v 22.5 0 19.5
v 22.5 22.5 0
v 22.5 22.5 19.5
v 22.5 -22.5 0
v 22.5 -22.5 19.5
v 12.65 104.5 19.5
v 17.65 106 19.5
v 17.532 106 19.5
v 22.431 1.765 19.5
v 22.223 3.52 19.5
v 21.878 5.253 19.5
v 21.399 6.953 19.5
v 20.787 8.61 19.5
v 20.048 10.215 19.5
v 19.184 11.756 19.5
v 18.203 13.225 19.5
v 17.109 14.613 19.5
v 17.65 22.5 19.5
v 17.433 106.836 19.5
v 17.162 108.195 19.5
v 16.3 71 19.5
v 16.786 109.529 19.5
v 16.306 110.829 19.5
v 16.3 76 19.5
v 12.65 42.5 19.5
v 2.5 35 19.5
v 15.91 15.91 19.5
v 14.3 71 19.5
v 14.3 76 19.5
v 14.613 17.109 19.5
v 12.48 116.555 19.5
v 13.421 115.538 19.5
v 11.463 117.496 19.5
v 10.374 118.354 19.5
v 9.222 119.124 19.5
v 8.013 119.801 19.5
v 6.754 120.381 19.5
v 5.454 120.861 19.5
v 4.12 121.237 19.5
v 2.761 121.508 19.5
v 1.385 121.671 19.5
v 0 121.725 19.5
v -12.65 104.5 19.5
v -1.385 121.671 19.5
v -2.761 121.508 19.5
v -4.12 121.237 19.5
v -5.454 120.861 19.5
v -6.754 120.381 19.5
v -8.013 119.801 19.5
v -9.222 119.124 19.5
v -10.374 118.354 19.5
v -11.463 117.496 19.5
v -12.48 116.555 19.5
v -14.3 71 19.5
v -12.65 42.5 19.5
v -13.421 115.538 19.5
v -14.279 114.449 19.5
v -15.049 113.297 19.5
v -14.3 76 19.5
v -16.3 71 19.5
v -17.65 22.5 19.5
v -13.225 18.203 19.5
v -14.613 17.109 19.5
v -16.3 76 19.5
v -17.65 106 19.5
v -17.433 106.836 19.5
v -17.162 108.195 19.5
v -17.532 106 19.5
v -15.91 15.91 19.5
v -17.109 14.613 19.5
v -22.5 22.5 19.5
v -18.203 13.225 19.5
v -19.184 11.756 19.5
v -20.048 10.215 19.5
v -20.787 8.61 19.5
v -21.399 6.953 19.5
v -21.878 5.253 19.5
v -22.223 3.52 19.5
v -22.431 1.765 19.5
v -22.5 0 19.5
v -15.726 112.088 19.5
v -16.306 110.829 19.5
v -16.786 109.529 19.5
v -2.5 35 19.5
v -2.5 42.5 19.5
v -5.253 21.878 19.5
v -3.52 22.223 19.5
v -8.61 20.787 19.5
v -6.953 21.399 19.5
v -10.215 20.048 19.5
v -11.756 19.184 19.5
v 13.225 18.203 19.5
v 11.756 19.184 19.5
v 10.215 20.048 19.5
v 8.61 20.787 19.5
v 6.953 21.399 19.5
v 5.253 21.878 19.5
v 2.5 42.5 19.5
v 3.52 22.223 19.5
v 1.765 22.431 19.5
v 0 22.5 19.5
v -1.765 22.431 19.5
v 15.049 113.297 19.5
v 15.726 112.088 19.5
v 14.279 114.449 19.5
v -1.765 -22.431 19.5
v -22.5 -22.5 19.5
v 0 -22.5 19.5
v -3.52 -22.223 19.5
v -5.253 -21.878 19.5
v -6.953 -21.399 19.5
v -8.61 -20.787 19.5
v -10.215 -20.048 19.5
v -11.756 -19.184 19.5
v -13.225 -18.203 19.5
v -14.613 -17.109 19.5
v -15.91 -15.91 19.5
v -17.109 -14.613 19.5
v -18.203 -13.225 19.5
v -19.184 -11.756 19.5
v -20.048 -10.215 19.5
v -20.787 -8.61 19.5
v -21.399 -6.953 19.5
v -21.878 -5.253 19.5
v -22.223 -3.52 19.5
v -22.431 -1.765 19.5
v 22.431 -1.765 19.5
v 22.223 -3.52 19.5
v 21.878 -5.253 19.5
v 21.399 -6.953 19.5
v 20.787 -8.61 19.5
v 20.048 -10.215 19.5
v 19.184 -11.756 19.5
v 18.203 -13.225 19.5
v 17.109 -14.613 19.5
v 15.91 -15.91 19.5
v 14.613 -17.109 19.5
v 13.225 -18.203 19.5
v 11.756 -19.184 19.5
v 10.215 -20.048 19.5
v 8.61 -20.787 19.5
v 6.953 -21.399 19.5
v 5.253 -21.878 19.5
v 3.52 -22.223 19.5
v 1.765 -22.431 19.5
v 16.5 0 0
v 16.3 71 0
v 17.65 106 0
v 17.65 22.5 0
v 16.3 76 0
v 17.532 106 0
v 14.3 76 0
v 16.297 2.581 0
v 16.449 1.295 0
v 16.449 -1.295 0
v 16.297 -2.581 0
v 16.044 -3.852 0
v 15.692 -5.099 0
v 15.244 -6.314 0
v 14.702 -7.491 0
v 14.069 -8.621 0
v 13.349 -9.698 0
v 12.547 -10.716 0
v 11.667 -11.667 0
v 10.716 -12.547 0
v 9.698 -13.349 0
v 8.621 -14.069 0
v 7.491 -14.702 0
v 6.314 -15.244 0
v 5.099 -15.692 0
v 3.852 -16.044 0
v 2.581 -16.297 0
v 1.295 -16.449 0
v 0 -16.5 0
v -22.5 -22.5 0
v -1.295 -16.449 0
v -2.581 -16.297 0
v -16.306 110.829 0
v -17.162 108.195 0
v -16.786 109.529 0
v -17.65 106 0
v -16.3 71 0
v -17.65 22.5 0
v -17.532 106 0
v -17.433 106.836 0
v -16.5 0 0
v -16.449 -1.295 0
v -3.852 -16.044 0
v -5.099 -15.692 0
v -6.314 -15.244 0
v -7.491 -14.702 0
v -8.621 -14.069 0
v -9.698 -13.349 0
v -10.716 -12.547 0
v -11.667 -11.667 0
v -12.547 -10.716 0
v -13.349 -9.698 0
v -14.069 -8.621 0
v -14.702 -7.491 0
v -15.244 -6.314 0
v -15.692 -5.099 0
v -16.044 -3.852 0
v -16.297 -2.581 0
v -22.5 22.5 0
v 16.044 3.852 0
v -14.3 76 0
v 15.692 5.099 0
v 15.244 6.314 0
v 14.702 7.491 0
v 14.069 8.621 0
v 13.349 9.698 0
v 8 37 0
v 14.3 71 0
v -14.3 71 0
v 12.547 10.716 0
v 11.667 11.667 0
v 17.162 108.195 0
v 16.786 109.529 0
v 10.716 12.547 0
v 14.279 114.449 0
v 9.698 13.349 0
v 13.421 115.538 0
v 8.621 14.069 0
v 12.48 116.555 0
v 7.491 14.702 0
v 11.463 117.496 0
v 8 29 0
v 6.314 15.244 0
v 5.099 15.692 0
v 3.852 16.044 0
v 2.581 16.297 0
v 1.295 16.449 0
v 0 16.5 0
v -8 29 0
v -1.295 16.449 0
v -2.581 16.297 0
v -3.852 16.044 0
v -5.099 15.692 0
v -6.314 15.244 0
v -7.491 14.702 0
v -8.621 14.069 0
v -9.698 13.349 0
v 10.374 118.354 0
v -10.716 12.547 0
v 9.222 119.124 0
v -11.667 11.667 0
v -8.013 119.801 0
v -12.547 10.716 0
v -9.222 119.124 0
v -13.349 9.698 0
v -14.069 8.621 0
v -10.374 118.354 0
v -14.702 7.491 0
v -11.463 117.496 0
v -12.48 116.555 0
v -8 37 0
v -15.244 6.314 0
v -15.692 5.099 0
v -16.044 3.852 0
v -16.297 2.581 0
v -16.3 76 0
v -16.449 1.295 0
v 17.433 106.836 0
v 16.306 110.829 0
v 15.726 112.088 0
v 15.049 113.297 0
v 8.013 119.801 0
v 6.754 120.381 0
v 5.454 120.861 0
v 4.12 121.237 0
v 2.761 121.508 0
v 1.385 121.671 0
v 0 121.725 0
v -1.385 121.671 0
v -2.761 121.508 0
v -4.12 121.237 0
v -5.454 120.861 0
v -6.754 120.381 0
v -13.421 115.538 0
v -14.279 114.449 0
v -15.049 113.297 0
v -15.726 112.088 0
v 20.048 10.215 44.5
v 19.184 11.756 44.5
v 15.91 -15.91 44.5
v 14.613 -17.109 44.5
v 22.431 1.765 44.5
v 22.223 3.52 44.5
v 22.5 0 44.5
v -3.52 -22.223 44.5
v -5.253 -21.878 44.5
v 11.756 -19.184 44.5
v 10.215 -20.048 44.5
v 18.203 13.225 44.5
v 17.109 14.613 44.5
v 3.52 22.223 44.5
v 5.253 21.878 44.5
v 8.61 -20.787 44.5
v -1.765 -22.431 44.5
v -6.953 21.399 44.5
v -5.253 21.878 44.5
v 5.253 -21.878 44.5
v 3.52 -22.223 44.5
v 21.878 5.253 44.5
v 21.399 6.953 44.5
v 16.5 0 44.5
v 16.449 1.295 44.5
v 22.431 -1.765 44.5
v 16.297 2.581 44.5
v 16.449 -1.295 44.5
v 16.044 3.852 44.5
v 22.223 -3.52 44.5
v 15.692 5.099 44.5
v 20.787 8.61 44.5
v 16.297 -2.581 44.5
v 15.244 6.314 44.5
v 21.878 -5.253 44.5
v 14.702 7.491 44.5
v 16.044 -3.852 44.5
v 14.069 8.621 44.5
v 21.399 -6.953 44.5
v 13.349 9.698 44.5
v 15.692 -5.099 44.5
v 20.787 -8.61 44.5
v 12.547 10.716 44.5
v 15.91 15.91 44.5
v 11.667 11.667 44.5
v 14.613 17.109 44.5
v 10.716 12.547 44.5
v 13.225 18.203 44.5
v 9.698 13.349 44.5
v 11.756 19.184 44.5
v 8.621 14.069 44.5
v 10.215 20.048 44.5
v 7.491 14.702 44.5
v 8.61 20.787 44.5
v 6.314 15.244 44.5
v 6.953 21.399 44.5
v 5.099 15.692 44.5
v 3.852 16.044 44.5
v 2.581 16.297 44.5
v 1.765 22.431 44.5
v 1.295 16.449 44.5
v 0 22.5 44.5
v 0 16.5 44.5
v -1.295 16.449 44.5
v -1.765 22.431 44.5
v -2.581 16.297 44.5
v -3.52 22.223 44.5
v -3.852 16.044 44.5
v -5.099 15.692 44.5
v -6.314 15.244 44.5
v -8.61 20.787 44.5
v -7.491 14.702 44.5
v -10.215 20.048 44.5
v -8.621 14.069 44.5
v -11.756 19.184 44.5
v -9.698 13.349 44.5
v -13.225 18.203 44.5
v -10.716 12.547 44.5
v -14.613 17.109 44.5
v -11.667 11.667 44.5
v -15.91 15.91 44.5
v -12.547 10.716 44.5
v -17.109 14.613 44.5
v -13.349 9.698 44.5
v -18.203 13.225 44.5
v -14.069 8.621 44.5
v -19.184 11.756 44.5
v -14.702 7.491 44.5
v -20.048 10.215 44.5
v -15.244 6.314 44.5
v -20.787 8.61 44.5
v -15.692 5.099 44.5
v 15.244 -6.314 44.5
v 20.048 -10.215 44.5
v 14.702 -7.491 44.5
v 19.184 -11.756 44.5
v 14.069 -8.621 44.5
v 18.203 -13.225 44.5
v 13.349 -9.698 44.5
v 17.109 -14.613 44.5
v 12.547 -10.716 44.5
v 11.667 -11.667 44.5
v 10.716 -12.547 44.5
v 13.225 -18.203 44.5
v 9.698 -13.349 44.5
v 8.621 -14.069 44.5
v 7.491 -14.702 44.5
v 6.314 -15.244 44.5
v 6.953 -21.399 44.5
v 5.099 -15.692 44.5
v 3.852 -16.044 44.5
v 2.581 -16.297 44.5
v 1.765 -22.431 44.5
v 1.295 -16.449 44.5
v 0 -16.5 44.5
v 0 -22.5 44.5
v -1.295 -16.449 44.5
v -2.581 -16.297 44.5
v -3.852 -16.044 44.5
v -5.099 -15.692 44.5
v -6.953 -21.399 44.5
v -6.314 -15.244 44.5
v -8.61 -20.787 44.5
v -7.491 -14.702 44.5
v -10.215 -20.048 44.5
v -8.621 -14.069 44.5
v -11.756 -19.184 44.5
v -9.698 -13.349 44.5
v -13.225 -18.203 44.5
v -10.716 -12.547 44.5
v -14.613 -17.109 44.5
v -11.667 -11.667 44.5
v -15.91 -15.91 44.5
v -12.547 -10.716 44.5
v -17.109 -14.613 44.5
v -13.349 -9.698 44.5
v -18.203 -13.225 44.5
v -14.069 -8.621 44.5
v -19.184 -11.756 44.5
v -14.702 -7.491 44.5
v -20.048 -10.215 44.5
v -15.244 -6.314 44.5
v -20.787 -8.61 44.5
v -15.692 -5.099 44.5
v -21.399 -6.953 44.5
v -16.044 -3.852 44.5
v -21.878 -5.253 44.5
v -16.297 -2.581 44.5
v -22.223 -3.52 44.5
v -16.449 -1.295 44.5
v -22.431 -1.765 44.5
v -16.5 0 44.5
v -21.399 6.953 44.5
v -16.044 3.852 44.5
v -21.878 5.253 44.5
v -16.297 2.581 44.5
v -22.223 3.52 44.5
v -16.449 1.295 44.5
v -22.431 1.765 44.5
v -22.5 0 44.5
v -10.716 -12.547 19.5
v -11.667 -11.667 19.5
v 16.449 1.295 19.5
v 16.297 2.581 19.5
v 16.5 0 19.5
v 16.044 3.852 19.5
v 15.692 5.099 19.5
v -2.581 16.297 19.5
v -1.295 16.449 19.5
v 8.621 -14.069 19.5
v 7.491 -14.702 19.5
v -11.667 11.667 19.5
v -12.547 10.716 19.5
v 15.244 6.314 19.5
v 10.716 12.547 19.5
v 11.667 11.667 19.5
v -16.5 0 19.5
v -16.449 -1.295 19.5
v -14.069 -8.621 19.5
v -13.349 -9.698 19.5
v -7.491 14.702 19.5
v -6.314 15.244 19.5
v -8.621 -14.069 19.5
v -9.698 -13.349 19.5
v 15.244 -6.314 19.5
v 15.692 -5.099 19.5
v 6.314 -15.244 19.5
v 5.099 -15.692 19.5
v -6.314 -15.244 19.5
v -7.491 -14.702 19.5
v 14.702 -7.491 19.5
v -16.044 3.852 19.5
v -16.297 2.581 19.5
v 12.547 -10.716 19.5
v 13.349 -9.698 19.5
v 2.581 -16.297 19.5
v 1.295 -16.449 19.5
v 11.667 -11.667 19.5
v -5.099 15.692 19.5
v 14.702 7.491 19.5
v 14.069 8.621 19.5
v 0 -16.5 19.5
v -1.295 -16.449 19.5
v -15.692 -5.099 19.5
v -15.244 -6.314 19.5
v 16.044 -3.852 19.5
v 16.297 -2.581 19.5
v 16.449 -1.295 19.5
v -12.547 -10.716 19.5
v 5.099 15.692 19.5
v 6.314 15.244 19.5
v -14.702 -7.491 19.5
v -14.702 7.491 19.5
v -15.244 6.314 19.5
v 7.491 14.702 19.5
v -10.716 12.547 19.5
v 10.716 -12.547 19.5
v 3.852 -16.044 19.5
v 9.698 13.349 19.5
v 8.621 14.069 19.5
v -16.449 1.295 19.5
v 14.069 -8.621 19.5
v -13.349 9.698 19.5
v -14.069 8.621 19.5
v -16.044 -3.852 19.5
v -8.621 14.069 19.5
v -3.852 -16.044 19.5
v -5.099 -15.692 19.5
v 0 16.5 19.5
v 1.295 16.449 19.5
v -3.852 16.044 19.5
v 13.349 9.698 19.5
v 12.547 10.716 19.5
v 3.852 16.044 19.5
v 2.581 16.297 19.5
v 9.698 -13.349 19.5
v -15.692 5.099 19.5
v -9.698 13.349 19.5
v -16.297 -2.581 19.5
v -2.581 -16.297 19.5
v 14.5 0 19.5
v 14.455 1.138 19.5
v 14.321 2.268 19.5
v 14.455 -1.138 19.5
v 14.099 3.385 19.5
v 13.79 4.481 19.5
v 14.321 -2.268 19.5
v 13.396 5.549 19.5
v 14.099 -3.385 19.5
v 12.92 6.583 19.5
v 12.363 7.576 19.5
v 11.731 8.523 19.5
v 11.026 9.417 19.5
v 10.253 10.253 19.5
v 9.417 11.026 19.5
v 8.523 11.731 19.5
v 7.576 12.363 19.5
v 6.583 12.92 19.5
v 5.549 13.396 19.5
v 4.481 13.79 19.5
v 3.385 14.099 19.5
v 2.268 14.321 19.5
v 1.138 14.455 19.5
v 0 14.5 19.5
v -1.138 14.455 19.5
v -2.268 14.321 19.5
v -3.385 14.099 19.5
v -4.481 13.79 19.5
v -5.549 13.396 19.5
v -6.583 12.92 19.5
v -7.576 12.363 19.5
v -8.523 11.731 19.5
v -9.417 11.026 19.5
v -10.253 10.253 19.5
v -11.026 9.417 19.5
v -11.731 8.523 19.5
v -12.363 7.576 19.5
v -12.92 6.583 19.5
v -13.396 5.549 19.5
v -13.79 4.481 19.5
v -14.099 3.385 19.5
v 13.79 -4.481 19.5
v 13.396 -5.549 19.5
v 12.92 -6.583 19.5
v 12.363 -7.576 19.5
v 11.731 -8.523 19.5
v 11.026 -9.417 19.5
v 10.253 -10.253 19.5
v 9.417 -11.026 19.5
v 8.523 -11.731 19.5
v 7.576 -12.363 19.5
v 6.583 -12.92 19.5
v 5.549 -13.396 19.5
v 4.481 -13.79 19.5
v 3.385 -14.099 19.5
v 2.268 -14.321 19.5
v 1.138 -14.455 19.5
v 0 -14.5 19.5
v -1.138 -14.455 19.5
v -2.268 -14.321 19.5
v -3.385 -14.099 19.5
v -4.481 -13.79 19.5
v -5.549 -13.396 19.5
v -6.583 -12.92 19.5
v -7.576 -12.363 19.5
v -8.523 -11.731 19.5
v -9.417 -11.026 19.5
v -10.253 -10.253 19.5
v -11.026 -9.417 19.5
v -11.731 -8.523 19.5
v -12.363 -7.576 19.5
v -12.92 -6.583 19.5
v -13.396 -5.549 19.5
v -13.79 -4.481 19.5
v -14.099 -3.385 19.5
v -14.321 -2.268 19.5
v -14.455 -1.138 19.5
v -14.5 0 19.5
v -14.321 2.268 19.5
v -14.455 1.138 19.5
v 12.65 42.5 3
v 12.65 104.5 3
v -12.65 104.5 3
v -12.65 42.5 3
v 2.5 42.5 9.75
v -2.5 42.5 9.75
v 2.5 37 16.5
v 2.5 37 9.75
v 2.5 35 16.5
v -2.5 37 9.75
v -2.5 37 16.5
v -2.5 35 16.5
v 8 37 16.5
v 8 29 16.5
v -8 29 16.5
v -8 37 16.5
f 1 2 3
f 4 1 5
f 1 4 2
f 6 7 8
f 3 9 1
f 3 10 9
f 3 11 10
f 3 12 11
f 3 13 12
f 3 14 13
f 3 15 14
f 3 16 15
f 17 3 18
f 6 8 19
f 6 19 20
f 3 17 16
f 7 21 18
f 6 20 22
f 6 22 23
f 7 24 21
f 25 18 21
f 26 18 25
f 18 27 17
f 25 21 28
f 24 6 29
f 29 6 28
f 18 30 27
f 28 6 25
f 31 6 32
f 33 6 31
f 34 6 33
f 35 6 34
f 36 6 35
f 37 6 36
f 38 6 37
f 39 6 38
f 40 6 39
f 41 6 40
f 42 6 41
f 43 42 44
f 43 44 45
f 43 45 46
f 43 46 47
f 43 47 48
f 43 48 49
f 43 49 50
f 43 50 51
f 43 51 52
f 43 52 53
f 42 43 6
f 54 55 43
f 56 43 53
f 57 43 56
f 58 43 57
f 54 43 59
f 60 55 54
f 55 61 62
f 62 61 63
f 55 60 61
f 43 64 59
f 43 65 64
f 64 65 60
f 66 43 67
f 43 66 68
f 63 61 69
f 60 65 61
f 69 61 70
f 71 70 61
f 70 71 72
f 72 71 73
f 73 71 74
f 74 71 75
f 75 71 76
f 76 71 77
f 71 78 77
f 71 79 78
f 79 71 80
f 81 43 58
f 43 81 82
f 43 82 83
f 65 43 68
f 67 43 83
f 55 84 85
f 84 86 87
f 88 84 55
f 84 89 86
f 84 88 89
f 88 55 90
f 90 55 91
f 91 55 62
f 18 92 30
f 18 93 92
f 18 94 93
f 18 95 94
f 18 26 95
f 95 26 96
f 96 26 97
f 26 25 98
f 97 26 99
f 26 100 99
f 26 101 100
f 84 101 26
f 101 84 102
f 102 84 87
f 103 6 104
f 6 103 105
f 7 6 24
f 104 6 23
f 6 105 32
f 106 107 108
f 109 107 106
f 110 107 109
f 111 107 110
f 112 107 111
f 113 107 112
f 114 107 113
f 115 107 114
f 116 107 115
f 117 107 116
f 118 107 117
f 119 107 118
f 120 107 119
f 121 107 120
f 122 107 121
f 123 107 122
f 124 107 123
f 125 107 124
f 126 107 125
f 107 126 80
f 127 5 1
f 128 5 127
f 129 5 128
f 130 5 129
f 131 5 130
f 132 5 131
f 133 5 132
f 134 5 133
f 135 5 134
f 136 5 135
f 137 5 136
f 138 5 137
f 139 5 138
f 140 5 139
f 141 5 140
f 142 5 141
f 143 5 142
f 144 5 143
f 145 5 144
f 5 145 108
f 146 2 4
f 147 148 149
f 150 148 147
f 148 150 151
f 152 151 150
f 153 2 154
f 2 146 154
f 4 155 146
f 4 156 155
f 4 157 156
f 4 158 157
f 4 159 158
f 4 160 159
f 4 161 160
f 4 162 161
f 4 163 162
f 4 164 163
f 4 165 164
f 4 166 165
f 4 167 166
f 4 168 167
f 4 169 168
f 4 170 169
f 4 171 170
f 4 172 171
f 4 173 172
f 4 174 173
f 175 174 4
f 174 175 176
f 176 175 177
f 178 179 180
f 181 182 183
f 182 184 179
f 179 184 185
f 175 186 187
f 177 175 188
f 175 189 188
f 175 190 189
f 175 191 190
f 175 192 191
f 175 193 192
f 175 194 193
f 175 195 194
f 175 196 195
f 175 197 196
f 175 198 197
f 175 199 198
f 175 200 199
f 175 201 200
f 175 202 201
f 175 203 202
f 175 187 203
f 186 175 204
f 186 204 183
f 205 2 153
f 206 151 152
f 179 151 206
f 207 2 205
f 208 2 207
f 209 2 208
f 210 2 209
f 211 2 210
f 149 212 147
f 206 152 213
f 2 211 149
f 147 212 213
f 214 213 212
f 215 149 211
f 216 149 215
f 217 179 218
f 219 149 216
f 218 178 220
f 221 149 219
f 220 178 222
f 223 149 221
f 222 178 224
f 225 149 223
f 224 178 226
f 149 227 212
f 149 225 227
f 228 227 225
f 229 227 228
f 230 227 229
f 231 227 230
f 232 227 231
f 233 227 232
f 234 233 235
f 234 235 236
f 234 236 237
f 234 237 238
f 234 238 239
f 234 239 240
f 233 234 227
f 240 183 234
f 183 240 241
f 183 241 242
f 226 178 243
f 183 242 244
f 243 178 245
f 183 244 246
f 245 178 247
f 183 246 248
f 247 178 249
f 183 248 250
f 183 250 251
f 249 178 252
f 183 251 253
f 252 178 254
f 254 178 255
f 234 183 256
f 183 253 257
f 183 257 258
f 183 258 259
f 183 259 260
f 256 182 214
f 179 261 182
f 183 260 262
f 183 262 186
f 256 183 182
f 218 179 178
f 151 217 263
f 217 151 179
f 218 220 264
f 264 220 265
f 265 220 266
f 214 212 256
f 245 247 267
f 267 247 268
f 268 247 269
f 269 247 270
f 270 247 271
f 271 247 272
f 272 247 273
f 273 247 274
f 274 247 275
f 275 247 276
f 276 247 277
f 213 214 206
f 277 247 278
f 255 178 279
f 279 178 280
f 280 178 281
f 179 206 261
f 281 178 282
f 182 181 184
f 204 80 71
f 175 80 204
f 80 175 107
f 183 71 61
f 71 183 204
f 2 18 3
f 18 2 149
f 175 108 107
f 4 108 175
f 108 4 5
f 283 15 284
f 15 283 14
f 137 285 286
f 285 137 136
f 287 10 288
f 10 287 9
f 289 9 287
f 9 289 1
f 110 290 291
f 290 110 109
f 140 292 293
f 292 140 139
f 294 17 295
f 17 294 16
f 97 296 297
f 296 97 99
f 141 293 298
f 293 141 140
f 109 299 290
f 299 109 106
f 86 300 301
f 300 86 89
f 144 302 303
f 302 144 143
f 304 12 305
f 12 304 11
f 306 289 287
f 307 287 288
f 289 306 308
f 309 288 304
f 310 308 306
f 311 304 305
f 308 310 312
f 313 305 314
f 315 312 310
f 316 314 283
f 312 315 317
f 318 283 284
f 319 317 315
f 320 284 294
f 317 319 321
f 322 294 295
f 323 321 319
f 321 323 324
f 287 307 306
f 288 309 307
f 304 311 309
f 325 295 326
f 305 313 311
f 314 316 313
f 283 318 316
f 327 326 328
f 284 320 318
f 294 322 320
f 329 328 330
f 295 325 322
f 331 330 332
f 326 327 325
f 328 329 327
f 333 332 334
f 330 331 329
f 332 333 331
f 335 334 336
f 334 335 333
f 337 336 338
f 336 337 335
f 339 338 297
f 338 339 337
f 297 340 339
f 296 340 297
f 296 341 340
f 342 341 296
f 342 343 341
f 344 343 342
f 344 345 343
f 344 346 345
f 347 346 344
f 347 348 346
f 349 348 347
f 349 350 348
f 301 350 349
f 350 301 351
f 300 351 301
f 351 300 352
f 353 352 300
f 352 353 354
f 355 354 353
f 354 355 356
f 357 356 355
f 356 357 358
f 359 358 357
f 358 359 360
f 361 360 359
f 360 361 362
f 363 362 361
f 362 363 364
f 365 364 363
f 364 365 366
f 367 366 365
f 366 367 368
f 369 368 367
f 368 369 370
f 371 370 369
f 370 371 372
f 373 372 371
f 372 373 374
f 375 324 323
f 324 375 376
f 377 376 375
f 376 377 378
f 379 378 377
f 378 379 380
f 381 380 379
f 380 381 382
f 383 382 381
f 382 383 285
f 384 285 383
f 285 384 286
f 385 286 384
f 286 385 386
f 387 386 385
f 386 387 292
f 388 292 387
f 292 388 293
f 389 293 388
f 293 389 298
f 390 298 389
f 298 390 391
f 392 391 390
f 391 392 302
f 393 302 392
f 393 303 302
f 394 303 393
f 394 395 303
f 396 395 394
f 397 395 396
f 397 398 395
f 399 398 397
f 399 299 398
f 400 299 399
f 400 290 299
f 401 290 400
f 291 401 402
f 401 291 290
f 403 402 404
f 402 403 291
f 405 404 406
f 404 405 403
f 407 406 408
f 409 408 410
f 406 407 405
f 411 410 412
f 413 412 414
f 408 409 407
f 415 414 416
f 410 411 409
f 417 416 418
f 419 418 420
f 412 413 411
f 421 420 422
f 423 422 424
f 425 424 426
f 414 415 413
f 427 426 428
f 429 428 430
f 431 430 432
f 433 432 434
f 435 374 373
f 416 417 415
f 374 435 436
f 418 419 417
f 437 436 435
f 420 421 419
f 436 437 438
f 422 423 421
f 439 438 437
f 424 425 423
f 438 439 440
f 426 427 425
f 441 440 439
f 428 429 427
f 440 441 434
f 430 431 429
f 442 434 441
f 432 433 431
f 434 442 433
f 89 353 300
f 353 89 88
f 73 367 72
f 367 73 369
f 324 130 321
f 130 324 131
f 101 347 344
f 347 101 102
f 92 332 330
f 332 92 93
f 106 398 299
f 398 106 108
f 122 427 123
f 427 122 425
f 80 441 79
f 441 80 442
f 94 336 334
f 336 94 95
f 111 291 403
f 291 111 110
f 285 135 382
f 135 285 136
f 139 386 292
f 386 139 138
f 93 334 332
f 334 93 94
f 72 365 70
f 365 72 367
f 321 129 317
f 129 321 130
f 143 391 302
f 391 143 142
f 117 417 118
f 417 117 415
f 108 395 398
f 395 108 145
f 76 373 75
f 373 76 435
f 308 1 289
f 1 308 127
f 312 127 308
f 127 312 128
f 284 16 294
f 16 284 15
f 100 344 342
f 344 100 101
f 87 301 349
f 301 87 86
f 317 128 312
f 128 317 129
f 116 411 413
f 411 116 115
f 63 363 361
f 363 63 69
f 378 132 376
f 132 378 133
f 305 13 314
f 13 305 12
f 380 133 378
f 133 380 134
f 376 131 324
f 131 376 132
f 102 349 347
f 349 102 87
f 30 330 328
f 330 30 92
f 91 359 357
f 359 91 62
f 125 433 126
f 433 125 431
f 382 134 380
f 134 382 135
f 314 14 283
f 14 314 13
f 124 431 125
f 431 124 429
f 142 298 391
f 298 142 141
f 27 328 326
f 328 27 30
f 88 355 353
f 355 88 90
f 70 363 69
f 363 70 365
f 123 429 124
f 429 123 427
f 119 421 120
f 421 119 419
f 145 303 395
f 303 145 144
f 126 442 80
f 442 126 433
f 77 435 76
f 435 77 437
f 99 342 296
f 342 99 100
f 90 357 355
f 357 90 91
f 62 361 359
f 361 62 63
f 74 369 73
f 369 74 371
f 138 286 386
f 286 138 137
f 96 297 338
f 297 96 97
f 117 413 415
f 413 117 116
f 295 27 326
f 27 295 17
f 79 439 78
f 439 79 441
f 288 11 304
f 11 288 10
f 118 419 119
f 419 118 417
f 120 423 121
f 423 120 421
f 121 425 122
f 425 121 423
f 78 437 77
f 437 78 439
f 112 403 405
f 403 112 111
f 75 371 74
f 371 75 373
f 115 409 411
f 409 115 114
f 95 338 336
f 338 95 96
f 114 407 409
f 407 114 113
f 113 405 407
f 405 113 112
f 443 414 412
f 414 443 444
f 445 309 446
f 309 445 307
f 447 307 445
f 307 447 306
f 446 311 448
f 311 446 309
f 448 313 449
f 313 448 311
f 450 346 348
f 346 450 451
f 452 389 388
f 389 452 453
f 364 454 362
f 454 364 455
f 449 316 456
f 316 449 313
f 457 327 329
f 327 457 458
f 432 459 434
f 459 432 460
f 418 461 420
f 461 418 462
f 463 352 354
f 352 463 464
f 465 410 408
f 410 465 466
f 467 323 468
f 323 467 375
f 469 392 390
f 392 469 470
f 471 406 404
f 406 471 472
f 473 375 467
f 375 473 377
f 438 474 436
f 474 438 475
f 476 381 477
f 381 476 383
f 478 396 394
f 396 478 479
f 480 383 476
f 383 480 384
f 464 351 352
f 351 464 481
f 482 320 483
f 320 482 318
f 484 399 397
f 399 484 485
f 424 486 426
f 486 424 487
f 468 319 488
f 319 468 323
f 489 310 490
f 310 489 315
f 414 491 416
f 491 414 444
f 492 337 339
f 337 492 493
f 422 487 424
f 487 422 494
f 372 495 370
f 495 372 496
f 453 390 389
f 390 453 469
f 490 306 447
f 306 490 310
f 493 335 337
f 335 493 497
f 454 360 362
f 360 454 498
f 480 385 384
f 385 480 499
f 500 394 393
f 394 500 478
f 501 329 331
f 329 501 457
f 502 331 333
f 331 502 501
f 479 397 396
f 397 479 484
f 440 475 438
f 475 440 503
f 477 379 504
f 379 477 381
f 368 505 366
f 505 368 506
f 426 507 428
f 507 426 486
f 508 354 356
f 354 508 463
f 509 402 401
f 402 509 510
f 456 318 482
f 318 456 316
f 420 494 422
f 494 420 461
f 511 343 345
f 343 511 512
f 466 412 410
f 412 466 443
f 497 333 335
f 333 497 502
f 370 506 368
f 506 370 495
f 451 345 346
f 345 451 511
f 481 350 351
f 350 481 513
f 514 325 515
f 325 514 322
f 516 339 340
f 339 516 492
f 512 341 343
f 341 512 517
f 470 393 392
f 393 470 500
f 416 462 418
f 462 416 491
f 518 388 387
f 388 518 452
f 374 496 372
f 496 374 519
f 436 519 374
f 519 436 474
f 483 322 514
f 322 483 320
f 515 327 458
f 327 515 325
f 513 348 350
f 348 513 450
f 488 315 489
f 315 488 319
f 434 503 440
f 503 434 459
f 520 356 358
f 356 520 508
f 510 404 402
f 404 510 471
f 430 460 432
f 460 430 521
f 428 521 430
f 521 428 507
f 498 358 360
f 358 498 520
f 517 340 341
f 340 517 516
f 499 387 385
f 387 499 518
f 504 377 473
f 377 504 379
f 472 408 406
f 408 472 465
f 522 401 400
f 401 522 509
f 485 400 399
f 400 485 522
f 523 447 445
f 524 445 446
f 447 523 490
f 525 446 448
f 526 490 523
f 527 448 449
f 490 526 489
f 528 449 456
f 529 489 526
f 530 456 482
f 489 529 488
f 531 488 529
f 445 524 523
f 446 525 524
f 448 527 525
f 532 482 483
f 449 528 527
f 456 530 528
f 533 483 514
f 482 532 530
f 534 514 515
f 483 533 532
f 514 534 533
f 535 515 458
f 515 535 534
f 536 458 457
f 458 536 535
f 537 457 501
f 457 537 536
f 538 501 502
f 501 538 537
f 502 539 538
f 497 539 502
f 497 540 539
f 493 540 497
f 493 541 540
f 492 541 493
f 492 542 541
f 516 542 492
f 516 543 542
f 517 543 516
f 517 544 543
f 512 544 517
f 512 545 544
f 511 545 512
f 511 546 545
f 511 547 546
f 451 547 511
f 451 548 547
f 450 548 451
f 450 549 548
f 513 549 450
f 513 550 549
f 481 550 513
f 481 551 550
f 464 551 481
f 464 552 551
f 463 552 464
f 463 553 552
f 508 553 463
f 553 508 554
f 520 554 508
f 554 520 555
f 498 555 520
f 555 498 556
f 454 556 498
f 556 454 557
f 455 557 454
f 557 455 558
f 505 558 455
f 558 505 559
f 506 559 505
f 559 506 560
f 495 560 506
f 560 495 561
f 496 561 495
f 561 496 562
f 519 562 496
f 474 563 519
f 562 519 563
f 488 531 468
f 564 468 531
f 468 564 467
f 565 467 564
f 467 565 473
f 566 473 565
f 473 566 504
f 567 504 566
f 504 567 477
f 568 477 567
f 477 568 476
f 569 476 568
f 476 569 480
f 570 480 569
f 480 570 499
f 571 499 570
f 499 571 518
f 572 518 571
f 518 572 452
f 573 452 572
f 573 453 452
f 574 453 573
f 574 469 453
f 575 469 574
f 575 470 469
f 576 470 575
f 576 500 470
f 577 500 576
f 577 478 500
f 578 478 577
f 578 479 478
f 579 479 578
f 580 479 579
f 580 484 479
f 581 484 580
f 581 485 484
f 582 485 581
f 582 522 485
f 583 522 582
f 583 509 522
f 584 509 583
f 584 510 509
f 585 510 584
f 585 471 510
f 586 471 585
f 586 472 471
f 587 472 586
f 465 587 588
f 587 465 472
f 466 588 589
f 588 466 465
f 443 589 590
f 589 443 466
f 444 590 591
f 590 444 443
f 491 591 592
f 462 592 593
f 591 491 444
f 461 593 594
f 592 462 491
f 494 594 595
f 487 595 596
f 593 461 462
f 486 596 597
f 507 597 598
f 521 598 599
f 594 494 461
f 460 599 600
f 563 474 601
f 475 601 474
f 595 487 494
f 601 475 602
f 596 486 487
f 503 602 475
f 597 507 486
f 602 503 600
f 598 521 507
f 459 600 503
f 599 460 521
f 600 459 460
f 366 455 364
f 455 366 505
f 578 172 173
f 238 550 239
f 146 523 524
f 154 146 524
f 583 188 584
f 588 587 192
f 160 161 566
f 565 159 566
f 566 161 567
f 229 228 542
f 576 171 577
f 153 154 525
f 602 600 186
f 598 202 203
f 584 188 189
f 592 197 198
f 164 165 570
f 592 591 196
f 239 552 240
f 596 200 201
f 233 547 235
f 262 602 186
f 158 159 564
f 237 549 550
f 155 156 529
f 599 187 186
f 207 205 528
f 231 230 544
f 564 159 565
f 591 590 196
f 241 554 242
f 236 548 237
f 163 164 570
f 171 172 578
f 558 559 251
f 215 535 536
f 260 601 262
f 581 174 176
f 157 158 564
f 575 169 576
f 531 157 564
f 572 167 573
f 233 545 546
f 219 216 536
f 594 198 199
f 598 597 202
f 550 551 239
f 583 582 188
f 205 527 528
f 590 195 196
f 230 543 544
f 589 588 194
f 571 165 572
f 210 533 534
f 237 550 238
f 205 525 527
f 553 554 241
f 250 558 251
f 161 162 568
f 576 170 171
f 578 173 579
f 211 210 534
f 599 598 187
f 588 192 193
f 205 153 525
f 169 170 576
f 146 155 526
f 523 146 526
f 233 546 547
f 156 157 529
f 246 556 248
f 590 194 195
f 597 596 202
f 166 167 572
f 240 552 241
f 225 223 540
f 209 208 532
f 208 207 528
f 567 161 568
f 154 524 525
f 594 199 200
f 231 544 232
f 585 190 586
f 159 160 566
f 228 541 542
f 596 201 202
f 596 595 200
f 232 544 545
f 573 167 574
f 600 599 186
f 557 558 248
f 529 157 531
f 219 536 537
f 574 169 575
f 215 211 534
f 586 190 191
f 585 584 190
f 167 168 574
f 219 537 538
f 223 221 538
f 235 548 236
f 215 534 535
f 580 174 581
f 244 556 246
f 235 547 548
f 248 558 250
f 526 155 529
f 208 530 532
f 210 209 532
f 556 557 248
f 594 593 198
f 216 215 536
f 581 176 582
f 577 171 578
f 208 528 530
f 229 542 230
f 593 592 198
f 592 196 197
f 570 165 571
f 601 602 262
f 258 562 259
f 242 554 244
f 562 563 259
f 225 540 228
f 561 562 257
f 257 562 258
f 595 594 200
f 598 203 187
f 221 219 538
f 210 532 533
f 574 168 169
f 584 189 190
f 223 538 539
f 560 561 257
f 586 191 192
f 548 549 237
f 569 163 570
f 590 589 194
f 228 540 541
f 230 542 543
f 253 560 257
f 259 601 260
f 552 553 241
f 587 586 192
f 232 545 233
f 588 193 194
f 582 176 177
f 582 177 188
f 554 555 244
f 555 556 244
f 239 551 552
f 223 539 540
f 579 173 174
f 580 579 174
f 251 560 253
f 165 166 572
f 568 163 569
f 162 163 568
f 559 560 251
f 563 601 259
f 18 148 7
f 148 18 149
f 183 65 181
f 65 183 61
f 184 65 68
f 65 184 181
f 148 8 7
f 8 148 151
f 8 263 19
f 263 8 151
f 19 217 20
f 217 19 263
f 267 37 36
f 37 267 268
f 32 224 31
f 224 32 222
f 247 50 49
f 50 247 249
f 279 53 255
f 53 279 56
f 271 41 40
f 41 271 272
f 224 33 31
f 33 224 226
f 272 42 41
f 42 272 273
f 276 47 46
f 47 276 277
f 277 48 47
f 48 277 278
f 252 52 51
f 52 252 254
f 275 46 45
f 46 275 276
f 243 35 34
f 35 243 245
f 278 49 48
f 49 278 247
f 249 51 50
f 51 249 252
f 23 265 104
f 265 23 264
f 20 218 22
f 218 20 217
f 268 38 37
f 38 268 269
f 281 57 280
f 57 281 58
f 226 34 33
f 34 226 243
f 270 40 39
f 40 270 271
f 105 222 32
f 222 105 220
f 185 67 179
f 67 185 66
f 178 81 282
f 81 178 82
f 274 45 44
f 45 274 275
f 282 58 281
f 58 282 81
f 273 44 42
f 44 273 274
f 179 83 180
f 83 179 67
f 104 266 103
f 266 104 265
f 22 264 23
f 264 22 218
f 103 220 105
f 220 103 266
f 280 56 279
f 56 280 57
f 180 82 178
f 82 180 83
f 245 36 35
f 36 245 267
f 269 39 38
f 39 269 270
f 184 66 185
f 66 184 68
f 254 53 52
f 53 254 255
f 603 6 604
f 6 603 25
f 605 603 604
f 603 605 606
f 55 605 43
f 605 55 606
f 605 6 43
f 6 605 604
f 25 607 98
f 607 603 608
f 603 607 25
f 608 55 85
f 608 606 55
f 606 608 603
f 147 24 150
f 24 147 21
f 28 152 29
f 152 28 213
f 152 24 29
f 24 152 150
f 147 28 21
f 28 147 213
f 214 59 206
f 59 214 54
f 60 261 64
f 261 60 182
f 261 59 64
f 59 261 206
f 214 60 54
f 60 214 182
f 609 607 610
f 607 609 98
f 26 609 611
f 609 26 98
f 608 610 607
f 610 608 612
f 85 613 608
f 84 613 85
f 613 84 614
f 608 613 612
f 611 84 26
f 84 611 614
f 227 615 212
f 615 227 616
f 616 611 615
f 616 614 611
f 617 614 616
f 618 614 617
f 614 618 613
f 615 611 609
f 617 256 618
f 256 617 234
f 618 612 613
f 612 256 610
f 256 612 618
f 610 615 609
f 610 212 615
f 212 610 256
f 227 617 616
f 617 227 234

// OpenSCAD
// [FL_INDEX: keywords="openscad, 3d_parametric, Fan_Blower, csg_solid" | COT="Parametric OpenSCAD design from 3DCodeverse"]
// Title: Fan Blower

add_battery_holder=true;
pipe_diameter=33;
fan_size=40;
battery_depth=16.5;
battery_width=25.3;
battery_height=52;
block_height=battery_depth + 3;
//block_height=16.5;

module fan_blower(){
difference(){
union(){
//create fan block
translate([0,0,block_height/2]) cube([fan_size+5,fan_size+5,block_height], center=true);
//add top shroud
translate([0,0,block_height]) cylinder(r=(fan_size+5)/2,h=25,$fn=80);
}
//create tube mount
translate([0,0,block_height]) cylinder(r=pipe_diameter/2,25,$fn=80);
//create air path
cylinder(r1=pipe_diameter/2,r2=(pipe_diameter-4)/2,29/2,h=block_height,$fn=80);
}
}


//create battery holder
module battery_holder(){
difference(){
union(){
//create main battery block bigger than battery dimensions
translate([0,((fan_size/2)+(battery_height/2)+(pipe_diameter/2)),block_height/2]) cube([battery_width+10,battery_height+35,block_height],center=true);

//add rounded end to it
translate([0,(fan_size/2+battery_height+10)+((battery_width/2+2.5)/2)+(pipe_diameter/2)-2,block_height/2]) cylinder(r=battery_width/2+5,h=battery_depth+3,$fn=80,center=true);
}

//take away battery recess
translate([0,(fan_size+5/2)+battery_height/2+5,block_height/2+1.5]) cube([battery_width,battery_height+10,battery_depth], center=true);

//create some slots for cable_tie
translate([(battery_width-10),(fan_size+5/2)+(battery_height/2)+5,block_height]) cube([2,5,block_height*2],center=true);
translate([(battery_width-(battery_width*2)+10),(fan_size+5/2)+(battery_height/2)+5,block_height]) cube([2,5,block_height*2],center=true);

//create a cable channel
//battery_height+30
translate([0,fan_size/2+20,block_height/2+5]) cube([5,10,10], center=true);

//create pocket for switch
translate([0,fan_size/2+13,battery_depth/2]) cube([16,8,block_height-3], center=true);
//translate([0,fan_size/2+13,battery_depth/2]) cube([23.3,7.6,2], center=true);

}
}

if (add_battery_holder==true)
{
union(){
fan_blower();
battery_holder();
}
} else {
fan_blower();
}
